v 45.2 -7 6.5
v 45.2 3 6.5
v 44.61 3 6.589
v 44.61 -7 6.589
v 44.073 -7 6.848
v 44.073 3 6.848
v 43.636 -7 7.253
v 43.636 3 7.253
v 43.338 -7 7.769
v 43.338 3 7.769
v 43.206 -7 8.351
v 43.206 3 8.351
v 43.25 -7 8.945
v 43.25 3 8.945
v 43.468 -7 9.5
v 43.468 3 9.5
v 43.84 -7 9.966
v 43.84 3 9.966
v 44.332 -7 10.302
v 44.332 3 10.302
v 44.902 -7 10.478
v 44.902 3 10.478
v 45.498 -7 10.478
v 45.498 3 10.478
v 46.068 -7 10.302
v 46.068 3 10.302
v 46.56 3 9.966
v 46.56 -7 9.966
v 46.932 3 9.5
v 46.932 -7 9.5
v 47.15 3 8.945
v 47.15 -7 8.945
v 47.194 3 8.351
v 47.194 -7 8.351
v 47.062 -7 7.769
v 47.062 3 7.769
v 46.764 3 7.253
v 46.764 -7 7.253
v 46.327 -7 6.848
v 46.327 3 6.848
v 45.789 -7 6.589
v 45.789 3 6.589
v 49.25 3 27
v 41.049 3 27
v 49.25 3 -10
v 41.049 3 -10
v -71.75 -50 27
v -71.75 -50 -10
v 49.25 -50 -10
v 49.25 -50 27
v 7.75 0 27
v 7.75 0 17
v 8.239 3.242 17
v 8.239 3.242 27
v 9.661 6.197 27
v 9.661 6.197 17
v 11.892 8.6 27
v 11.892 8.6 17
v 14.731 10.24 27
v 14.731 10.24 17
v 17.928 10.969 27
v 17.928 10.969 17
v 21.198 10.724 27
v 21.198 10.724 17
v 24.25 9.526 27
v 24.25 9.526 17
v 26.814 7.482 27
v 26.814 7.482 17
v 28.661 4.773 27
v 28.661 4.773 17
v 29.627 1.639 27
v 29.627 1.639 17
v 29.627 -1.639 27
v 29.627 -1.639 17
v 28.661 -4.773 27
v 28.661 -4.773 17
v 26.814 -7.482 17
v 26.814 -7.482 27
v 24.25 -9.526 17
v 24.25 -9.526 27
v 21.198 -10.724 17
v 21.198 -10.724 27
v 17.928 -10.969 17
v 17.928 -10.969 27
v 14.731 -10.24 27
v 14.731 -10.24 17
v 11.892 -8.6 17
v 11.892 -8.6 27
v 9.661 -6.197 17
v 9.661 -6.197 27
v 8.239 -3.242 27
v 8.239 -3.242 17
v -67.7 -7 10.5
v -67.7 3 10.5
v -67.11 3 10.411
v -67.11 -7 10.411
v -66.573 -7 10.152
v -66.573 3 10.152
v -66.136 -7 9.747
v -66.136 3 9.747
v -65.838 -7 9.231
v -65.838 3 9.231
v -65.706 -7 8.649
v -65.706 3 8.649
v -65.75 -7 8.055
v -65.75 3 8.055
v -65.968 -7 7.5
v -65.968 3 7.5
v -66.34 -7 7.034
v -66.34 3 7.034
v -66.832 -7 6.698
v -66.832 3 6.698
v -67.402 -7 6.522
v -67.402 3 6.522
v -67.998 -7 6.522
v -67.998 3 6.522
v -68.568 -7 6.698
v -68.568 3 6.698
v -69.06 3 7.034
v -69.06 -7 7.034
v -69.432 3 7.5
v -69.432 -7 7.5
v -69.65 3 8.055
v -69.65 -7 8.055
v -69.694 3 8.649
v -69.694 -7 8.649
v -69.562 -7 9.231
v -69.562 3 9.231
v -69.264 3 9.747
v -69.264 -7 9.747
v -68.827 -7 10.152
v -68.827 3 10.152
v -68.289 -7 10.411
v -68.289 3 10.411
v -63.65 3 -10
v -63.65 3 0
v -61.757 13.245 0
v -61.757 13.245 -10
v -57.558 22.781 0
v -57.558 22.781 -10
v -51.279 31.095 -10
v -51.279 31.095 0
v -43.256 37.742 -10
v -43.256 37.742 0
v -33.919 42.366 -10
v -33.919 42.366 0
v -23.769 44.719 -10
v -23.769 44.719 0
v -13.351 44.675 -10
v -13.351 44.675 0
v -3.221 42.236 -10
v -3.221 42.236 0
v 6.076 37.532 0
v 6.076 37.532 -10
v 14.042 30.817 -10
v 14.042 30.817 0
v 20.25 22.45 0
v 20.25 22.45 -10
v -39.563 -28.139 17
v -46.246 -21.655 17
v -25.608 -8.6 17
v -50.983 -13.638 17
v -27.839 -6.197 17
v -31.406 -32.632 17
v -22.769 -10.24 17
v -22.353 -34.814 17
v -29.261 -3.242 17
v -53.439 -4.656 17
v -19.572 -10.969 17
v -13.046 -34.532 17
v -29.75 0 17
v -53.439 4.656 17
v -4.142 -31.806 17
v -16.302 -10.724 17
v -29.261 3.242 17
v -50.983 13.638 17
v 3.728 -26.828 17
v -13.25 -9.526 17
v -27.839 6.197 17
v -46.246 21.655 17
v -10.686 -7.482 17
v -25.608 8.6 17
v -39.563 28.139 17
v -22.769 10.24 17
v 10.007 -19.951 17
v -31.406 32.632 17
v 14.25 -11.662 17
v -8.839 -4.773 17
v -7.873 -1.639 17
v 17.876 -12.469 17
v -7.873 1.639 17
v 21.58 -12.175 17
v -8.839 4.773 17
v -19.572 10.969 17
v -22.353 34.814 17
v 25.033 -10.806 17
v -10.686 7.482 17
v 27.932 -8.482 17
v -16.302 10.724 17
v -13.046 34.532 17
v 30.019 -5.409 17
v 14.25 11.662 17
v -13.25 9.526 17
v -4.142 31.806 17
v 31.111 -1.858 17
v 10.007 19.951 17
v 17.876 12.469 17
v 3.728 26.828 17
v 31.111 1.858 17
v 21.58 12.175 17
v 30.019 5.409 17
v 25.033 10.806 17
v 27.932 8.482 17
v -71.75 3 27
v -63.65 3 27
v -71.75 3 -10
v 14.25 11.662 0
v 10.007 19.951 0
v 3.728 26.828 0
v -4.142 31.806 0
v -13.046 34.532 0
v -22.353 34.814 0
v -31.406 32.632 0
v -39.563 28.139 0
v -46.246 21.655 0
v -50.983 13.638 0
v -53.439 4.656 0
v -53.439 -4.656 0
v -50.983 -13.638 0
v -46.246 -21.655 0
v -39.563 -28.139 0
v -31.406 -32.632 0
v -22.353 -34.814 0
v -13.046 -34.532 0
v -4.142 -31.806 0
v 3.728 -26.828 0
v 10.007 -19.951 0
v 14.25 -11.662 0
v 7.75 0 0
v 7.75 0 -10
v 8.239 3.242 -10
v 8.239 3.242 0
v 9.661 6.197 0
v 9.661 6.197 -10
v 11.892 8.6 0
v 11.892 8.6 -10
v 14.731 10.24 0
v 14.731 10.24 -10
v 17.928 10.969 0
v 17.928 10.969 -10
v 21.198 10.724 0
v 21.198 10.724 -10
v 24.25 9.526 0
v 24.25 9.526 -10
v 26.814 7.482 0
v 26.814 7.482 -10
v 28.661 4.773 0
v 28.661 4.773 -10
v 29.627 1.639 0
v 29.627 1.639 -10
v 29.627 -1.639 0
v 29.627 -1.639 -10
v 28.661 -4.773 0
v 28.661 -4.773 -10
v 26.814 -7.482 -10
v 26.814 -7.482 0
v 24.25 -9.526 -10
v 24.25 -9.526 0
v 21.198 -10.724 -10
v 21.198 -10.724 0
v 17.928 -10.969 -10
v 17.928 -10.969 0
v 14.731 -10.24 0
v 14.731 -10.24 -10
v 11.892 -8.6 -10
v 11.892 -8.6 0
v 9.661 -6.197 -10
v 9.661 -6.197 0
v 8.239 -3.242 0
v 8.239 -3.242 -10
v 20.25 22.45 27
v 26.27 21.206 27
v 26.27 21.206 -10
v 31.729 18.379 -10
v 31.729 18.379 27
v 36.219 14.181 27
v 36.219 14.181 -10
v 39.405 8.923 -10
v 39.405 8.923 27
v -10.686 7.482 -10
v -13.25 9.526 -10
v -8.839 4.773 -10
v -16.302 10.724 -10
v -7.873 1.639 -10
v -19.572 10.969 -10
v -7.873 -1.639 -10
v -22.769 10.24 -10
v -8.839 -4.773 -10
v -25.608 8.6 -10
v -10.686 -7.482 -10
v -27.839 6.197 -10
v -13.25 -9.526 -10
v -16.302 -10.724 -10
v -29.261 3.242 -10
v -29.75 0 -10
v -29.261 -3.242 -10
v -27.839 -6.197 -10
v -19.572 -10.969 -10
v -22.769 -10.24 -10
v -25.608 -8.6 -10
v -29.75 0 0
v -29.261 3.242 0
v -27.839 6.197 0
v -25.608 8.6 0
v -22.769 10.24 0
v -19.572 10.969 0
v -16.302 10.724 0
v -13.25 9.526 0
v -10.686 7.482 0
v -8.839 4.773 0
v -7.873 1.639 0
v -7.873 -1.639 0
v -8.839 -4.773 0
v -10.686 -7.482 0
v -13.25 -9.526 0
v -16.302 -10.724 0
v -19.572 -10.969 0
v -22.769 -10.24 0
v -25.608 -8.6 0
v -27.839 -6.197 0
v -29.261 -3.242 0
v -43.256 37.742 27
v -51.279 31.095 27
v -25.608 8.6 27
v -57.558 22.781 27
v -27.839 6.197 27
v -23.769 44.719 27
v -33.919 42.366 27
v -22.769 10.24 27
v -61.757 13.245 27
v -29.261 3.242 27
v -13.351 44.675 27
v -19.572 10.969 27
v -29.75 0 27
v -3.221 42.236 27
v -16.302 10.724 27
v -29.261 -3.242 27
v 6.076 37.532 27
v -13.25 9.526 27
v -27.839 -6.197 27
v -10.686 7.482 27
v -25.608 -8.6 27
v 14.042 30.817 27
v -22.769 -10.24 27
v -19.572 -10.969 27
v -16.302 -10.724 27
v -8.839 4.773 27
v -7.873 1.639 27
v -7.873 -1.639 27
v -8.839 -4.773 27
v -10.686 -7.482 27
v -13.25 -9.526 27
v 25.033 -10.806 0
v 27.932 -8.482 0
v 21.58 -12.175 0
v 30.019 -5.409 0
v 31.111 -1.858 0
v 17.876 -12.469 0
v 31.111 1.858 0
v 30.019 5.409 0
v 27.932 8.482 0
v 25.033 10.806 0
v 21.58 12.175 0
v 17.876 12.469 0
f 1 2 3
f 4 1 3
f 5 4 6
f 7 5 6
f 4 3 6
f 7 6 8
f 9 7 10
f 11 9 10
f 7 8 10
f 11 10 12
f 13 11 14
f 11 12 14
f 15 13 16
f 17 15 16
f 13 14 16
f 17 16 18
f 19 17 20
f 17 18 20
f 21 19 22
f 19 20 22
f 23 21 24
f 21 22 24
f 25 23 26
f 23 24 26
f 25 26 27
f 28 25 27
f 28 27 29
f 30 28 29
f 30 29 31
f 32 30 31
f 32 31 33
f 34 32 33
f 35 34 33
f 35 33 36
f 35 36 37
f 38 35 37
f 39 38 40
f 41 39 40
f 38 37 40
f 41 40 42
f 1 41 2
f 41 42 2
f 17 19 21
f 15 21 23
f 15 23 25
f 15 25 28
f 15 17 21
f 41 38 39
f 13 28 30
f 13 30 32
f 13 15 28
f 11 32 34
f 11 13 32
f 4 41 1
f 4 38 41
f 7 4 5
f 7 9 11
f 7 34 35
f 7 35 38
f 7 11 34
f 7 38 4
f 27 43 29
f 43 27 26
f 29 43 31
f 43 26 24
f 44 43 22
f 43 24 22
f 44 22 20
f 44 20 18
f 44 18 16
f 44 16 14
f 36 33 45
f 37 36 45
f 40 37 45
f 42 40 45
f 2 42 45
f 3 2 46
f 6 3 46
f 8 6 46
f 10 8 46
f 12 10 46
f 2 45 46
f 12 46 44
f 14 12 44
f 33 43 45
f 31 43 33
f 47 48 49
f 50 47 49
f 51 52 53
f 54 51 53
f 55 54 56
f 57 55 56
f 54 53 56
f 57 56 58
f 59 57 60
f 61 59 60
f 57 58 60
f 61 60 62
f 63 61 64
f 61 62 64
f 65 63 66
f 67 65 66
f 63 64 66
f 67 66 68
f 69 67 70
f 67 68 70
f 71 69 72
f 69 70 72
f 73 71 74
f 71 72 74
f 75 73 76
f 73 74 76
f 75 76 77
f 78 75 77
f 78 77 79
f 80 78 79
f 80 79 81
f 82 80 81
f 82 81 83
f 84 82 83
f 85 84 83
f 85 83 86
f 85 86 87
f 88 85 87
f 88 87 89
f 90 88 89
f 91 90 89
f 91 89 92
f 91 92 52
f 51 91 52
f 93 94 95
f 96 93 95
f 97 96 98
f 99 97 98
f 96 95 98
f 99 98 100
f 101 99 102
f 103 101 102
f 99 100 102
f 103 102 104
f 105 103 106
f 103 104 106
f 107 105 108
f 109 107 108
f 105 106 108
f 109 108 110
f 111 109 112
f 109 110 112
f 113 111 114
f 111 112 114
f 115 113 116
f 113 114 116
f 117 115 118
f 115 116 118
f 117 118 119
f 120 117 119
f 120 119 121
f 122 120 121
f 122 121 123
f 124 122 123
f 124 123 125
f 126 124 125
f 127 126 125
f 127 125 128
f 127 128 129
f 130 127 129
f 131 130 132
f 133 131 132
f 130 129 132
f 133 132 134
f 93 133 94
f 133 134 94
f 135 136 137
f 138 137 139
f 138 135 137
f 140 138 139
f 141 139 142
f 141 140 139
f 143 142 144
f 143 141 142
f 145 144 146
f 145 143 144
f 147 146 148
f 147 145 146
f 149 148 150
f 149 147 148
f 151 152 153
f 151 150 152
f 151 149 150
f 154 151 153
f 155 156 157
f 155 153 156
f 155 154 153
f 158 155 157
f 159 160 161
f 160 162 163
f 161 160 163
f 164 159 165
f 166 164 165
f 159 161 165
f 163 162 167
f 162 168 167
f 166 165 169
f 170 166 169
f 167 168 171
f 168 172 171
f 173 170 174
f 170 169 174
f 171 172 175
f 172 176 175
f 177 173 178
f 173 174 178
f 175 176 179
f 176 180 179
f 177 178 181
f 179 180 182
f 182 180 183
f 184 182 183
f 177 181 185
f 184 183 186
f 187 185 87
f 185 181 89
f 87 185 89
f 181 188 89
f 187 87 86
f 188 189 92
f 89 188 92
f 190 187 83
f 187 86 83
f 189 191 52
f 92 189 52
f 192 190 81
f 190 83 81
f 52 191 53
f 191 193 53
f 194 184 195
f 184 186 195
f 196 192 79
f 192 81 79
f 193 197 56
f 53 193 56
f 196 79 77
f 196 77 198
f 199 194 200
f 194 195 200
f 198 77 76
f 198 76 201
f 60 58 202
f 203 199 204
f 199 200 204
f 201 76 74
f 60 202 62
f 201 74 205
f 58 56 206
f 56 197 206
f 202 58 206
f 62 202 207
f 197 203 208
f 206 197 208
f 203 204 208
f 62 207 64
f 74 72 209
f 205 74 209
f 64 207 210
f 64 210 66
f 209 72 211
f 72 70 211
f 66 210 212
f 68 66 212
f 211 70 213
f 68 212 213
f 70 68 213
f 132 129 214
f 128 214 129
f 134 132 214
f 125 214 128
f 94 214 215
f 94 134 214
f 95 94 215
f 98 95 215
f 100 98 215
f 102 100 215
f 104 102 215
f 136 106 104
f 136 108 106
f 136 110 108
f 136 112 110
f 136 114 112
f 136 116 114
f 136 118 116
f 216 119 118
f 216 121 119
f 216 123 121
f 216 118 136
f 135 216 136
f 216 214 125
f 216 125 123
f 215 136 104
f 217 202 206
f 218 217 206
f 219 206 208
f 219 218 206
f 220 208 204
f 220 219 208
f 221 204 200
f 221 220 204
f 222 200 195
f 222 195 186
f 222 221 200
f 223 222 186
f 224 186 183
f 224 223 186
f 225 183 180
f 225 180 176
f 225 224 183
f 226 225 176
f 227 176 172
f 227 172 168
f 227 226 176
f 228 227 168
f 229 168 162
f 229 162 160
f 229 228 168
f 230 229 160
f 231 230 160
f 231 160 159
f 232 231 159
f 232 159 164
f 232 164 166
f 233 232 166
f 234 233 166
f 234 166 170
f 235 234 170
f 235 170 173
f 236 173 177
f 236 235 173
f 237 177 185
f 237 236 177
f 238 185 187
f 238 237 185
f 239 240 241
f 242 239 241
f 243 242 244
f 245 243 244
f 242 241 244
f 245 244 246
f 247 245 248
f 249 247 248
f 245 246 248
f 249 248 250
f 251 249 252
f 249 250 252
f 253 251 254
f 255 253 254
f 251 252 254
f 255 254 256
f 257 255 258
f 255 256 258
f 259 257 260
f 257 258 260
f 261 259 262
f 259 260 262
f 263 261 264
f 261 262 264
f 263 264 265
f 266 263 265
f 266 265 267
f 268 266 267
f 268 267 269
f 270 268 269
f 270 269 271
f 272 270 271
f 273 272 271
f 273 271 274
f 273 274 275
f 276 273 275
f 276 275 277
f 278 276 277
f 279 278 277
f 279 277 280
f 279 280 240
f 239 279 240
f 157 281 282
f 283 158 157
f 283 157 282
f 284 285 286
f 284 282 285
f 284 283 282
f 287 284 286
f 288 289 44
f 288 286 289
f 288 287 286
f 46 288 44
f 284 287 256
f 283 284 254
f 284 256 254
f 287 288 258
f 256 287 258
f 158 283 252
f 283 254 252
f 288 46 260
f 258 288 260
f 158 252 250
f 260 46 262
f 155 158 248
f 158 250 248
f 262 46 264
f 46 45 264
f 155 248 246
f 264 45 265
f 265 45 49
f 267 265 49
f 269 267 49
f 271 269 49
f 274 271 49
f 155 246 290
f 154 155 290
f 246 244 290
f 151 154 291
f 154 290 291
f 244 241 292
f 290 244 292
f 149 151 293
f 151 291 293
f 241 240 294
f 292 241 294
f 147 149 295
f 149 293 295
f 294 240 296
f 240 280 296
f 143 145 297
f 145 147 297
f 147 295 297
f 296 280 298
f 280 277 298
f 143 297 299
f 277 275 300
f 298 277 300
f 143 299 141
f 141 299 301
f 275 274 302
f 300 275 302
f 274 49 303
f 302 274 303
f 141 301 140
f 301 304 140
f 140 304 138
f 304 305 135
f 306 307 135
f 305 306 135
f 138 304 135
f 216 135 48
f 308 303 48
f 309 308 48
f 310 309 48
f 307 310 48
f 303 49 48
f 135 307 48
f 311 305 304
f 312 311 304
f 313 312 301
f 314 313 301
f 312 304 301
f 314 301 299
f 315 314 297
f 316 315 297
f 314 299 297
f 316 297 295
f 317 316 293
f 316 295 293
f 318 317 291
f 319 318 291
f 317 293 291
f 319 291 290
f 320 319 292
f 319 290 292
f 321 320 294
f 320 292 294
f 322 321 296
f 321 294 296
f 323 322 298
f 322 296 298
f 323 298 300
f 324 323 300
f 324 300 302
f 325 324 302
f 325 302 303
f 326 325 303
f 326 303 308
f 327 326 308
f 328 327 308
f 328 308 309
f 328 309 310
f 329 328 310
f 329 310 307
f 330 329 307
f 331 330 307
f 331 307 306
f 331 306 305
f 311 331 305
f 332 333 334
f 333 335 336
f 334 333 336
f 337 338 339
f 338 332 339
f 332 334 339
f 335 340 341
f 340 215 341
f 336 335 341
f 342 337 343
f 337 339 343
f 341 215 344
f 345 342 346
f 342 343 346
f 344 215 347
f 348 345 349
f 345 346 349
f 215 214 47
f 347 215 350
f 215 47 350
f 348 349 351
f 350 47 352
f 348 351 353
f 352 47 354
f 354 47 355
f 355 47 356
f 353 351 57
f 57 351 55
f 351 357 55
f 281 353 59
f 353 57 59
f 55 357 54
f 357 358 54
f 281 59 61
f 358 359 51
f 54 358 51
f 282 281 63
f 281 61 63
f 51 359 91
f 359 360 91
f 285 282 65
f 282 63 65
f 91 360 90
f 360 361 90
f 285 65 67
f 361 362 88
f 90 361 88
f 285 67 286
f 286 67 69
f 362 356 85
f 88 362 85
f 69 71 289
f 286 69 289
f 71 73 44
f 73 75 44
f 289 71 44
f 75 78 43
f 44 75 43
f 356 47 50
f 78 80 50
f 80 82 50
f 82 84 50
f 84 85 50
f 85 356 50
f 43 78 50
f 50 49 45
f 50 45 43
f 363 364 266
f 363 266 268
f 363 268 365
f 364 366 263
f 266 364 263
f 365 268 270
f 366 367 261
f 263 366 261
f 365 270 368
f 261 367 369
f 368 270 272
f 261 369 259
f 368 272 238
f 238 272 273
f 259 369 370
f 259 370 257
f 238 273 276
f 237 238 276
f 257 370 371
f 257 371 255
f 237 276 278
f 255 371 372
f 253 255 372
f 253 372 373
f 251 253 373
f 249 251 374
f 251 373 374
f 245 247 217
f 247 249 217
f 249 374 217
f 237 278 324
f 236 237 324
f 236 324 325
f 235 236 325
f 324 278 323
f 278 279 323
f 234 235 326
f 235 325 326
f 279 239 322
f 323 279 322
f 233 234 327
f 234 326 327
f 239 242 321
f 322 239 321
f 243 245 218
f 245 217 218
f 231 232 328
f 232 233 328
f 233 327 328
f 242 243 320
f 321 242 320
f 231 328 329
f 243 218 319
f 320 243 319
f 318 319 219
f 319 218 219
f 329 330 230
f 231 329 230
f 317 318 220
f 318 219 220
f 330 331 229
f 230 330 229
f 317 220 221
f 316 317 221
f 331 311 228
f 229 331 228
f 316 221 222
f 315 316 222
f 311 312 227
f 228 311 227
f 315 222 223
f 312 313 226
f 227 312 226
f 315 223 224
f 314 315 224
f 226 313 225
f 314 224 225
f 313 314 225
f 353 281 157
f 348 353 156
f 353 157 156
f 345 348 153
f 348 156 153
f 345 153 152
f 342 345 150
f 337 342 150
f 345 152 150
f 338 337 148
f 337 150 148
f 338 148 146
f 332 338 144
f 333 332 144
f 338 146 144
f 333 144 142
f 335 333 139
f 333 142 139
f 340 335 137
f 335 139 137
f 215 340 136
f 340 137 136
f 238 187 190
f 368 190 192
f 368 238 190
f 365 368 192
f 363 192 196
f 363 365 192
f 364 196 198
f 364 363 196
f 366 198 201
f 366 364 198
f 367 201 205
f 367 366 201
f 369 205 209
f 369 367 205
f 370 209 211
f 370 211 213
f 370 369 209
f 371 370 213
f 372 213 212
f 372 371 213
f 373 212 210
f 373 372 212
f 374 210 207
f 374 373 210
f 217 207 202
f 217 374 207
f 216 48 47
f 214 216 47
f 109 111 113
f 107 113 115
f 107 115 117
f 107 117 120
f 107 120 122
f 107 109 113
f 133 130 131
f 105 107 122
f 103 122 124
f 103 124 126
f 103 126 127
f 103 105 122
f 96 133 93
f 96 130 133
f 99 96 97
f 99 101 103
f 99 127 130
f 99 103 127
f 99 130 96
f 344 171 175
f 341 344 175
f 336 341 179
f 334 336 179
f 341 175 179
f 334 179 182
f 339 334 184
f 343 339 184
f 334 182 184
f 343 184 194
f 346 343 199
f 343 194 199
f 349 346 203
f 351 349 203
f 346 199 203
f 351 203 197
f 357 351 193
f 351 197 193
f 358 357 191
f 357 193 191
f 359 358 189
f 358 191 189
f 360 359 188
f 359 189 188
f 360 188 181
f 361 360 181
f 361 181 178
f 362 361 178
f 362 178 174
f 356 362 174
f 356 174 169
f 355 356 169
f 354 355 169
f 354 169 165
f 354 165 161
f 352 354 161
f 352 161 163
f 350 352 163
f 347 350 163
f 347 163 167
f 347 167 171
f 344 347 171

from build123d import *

# Parameters (mm, degrees)
BOSS_EXTRUDE2_DEPTH      = 27
SHELL5_DEPTH             = 17
BOSS_EXTRUDE3_START      = 10
BOSS_EXTRUDE3_DEPTH      = 10
SKETCH5_R                = 11
CUT_EXTRUDE2_DEPTH       = 87.360074687
BOSS_EXTRUDE4_DEPTH      = 37
BOSS_EXTRUDE5_DEPTH      = 3
BOSS_EXTRUDE5_DEPTH_BACK = 50
SKETCH10_R               = 2
CUT_EXTRUDE3_DEPTH       = 10


# Read off the part's stored shape, not the designer's step: Shell5
with BuildPart() as part:
    # Sketch1 → Boss-Extrude2 (new body)
    with BuildSketch(Plane.XY):
        with BuildLine():
            ThreePointArc((20.25, 22.449944321), (-63.75, 0), (20.25, -22.449944321))
            ThreePointArc((20.25, -22.449944321), (41.25, 0), (20.25, 22.449944321))
        make_face()
    extrude(amount=BOSS_EXTRUDE2_DEPTH)

    # Shell5 outline → Shell5 (cut)
    with BuildSketch(Plane.XY):
        with BuildLine():
            ThreePointArc((14.25, -11.66190379), (31.25, 0), (14.25, 11.66190379))
            ThreePointArc((14.25, 11.66190379), (-53.75, 0), (14.25, -11.66190379))
        make_face()
    extrude(amount=SHELL5_DEPTH, mode=Mode.SUBTRACT)

    # Sketch4 → Boss-Extrude3 (add)
    with BuildSketch(Plane(origin=(0, 0, 0), x_dir=(-1, 0, 0), z_dir=(0, 0, -1)).offset(BOSS_EXTRUDE3_START)):
        with BuildLine():
            ThreePointArc((-20.25, 22.449944321), (-41.25, 0), (-20.25, -22.449944321))
            ThreePointArc((-20.25, -22.449944321), (63.75, 0), (-20.25, 22.449944321))
        make_face()
    extrude(amount=-BOSS_EXTRUDE3_DEPTH)

    # Sketch5 → Cut-Extrude2 (cut, through all)
    with BuildSketch(Plane(origin=(0, 0, -10), x_dir=(-1, 0, 0), z_dir=(0, 0, -1))):
        with Locations((-18.75, 0)):
            Circle(SKETCH5_R)
        with Locations((18.75, 0)):
            Circle(SKETCH5_R)
    extrude(amount=-CUT_EXTRUDE2_DEPTH, mode=Mode.SUBTRACT)

    # Sketch8 → Boss-Extrude4 (add)
    with BuildSketch(Plane(origin=(0, 0, -10), x_dir=(-1, 0, 0), z_dir=(0, 0, -1))):
        with BuildLine():
            Line((-41.25, 0), (-41.25, -50))
            Line((-41.25, -50), (63.75, -50))
            Line((63.75, -50), (63.75, 0))
            ThreePointArc((63.75, 0), (30.368950039, -43.474130239), (-20.25, -22.449944321))
            ThreePointArc((-20.25, -22.449944321), (-35.181676725, -15.370426149), (-41.25, 0))
        make_face()
    extrude(amount=-BOSS_EXTRUDE4_DEPTH)

    # Sketch9 → Boss-Extrude5 (add, two sides: drawn at the far end of the back side and taken through both)
    with BuildSketch(Plane(origin=(0, 0, 0), x_dir=(1, 0, 0), z_dir=(0, 1, 0)).offset(-BOSS_EXTRUDE5_DEPTH_BACK)):
        Polygon((-71.75, -27), (-58.75, -27), (-58.75, -8.5), (-58.75, 10), (-71.75, 10), align=None)
        Polygon((36.25, -8.5), (36.25, 10), (49.25, 10), (49.25, -27), (36.25, -27), align=None)
    extrude(amount=BOSS_EXTRUDE5_DEPTH + BOSS_EXTRUDE5_DEPTH_BACK)

    # Sketch10 → Cut-Extrude3 (cut)
    with BuildSketch(Plane(origin=(0, 3, 0), x_dir=(1, 0, 0), z_dir=(0, 1, 0))):
        with Locations(Location((-67.699944321, -8.5, 0), (0, 0, 270))):
            Circle(SKETCH10_R)
        with Locations(Location((45.199944321, -8.5, 0), (0, 0, 90))):
            Circle(SKETCH10_R)
    extrude(amount=-CUT_EXTRUDE3_DEPTH, mode=Mode.SUBTRACT)


solid = part.part
